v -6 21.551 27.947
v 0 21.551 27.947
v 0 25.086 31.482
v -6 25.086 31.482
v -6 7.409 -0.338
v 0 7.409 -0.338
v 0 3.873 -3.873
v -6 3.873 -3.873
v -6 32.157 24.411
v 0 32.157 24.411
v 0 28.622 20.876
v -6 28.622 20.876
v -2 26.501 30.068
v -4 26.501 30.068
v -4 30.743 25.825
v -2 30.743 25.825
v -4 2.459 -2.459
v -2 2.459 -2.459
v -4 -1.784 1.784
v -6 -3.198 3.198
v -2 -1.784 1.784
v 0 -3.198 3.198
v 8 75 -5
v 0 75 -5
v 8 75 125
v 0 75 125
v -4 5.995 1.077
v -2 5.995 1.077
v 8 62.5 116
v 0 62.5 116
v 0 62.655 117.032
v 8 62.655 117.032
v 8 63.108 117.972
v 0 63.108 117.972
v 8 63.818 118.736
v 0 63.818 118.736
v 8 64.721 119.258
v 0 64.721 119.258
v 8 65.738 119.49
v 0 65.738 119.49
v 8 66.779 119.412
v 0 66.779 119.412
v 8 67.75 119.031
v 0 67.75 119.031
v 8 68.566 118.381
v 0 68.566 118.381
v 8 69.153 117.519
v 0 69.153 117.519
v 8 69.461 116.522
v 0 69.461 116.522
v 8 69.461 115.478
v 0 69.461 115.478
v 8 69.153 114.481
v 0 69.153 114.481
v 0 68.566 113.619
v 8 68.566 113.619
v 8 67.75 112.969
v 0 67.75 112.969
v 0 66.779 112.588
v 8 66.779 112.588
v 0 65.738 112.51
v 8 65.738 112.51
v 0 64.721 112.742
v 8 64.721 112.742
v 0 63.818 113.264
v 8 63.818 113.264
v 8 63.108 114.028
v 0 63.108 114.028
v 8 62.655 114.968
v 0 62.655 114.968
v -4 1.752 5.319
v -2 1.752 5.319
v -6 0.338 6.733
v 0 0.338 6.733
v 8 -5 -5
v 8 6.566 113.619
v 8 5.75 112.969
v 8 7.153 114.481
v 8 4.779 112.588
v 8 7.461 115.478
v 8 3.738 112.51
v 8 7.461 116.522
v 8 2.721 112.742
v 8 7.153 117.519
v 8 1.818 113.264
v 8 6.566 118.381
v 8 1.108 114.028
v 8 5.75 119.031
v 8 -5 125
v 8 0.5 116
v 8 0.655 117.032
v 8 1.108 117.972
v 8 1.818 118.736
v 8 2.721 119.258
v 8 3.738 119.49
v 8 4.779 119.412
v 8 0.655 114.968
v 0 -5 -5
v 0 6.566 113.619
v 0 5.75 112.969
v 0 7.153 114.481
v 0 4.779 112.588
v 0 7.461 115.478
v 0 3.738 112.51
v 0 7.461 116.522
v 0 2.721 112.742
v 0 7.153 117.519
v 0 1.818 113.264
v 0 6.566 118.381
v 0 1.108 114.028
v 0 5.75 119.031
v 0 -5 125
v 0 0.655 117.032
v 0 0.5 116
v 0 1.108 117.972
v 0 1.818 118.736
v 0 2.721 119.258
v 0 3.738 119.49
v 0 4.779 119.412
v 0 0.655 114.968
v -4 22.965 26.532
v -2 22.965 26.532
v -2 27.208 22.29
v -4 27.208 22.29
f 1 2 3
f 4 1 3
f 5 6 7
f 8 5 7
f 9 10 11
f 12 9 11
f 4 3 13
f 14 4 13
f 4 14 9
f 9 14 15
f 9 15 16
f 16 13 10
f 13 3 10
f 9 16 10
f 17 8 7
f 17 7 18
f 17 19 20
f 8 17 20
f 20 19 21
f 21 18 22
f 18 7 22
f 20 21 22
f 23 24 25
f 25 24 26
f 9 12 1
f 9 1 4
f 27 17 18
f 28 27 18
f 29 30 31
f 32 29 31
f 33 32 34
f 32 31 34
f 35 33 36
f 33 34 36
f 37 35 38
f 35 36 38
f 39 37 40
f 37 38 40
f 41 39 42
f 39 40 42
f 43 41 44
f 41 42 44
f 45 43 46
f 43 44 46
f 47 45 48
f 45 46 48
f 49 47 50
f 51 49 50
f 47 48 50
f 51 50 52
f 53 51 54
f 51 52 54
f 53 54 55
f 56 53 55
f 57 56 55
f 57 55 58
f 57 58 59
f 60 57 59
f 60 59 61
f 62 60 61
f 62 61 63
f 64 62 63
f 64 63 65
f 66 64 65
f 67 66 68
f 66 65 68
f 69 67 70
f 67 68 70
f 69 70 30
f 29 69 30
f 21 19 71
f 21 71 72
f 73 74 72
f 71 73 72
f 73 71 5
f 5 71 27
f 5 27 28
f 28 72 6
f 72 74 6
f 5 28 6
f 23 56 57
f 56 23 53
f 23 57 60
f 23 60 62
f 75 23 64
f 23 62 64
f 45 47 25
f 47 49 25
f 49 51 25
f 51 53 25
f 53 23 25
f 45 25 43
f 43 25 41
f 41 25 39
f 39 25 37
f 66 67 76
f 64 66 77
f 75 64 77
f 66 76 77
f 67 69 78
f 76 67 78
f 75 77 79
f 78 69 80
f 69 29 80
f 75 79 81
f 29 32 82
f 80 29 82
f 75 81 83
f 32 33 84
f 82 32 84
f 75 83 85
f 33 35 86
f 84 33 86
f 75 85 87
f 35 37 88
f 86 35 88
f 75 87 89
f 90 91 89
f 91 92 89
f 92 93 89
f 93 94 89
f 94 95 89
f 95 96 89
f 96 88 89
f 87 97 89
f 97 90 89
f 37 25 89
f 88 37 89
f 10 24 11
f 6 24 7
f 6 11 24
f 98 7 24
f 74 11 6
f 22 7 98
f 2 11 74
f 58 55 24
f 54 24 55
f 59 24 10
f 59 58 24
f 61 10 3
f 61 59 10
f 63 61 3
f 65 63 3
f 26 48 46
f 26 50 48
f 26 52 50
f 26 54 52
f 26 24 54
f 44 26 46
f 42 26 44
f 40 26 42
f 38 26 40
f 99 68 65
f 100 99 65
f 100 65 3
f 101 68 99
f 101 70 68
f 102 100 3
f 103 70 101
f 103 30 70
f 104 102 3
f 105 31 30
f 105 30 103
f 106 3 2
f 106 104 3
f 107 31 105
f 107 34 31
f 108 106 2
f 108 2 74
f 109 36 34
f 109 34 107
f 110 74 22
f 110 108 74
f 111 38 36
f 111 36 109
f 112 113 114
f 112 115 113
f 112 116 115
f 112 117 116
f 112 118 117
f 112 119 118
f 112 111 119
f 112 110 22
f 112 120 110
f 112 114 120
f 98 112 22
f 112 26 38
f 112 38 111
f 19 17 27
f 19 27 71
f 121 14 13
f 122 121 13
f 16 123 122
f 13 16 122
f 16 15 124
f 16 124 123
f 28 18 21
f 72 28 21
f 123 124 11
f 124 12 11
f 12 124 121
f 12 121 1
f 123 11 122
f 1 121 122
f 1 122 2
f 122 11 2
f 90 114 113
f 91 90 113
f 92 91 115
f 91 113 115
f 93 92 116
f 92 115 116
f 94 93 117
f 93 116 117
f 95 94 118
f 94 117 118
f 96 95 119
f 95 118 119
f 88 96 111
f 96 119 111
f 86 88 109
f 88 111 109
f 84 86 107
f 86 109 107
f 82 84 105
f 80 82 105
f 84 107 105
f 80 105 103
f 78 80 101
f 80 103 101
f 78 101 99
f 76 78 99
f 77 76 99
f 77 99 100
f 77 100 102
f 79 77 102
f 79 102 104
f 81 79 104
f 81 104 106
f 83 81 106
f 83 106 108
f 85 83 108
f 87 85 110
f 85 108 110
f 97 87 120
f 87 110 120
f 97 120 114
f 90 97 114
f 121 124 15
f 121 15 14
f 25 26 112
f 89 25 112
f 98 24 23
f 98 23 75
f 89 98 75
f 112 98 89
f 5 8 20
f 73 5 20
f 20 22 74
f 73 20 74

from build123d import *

# Parameters (mm, degrees)
SKETCH1_W                   = 80
SKETCH1_H                   = 130
SKETCH1_R                   = 3.5
BOSS_EXTRUDE1_DEPTH         = 8
DODANIE_WYCI_GNI_CIE1_DEPTH = 6
SZKIC2_W                    = 2
SZKIC2_H                    = 6
WYTNIJ_WYCI_GNI_CIE1_DEPTH  = 40


with BuildPart() as part:
    # Sketch1 → Boss-Extrude1 (new body)
    with BuildSketch(Plane(origin=(0, 0, 0), x_dir=(0, -1, 0), z_dir=(-1, 0, 0))):
        with Locations((-35, 60)):
            Rectangle(SKETCH1_W, SKETCH1_H)
        with Locations((-66, 116)):
            Circle(SKETCH1_R, mode=Mode.SUBTRACT)
        with Locations((-4, 116)):
            Circle(SKETCH1_R, mode=Mode.SUBTRACT)
    extrude(amount=-BOSS_EXTRUDE1_DEPTH)

    # Szkic1 → Dodanie-wyciągnięcie1 (add)
    with BuildSketch(Plane.ZY):
        Polygon((-3.873206623, 3.873206623), (3.197861189, -3.197861189), (6.733395095, 0.337672717), (-0.337672717, 7.408740528), align=None)
        Polygon((20.875530719, 28.621943964), (27.946598531, 21.550876152), (31.482132437, 25.086410058), (24.411064625, 32.15747787), align=None)
    extrude(amount=DODANIE_WYCI_GNI_CIE1_DEPTH)

    # Szkic2 → Wytnij-wyciągnięcie1 (cut)
    with BuildSketch(Plane(origin=(0, 0, 0), x_dir=(1, 0, 0), z_dir=(0, -0.707106781, -0.707106781))):
        with Locations((-3, -0.477541336)):
            Rectangle(SZKIC2_W, SZKIC2_H)
    extrude(amount=-WYTNIJ_WYCI_GNI_CIE1_DEPTH, mode=Mode.SUBTRACT)


solid = part.part
